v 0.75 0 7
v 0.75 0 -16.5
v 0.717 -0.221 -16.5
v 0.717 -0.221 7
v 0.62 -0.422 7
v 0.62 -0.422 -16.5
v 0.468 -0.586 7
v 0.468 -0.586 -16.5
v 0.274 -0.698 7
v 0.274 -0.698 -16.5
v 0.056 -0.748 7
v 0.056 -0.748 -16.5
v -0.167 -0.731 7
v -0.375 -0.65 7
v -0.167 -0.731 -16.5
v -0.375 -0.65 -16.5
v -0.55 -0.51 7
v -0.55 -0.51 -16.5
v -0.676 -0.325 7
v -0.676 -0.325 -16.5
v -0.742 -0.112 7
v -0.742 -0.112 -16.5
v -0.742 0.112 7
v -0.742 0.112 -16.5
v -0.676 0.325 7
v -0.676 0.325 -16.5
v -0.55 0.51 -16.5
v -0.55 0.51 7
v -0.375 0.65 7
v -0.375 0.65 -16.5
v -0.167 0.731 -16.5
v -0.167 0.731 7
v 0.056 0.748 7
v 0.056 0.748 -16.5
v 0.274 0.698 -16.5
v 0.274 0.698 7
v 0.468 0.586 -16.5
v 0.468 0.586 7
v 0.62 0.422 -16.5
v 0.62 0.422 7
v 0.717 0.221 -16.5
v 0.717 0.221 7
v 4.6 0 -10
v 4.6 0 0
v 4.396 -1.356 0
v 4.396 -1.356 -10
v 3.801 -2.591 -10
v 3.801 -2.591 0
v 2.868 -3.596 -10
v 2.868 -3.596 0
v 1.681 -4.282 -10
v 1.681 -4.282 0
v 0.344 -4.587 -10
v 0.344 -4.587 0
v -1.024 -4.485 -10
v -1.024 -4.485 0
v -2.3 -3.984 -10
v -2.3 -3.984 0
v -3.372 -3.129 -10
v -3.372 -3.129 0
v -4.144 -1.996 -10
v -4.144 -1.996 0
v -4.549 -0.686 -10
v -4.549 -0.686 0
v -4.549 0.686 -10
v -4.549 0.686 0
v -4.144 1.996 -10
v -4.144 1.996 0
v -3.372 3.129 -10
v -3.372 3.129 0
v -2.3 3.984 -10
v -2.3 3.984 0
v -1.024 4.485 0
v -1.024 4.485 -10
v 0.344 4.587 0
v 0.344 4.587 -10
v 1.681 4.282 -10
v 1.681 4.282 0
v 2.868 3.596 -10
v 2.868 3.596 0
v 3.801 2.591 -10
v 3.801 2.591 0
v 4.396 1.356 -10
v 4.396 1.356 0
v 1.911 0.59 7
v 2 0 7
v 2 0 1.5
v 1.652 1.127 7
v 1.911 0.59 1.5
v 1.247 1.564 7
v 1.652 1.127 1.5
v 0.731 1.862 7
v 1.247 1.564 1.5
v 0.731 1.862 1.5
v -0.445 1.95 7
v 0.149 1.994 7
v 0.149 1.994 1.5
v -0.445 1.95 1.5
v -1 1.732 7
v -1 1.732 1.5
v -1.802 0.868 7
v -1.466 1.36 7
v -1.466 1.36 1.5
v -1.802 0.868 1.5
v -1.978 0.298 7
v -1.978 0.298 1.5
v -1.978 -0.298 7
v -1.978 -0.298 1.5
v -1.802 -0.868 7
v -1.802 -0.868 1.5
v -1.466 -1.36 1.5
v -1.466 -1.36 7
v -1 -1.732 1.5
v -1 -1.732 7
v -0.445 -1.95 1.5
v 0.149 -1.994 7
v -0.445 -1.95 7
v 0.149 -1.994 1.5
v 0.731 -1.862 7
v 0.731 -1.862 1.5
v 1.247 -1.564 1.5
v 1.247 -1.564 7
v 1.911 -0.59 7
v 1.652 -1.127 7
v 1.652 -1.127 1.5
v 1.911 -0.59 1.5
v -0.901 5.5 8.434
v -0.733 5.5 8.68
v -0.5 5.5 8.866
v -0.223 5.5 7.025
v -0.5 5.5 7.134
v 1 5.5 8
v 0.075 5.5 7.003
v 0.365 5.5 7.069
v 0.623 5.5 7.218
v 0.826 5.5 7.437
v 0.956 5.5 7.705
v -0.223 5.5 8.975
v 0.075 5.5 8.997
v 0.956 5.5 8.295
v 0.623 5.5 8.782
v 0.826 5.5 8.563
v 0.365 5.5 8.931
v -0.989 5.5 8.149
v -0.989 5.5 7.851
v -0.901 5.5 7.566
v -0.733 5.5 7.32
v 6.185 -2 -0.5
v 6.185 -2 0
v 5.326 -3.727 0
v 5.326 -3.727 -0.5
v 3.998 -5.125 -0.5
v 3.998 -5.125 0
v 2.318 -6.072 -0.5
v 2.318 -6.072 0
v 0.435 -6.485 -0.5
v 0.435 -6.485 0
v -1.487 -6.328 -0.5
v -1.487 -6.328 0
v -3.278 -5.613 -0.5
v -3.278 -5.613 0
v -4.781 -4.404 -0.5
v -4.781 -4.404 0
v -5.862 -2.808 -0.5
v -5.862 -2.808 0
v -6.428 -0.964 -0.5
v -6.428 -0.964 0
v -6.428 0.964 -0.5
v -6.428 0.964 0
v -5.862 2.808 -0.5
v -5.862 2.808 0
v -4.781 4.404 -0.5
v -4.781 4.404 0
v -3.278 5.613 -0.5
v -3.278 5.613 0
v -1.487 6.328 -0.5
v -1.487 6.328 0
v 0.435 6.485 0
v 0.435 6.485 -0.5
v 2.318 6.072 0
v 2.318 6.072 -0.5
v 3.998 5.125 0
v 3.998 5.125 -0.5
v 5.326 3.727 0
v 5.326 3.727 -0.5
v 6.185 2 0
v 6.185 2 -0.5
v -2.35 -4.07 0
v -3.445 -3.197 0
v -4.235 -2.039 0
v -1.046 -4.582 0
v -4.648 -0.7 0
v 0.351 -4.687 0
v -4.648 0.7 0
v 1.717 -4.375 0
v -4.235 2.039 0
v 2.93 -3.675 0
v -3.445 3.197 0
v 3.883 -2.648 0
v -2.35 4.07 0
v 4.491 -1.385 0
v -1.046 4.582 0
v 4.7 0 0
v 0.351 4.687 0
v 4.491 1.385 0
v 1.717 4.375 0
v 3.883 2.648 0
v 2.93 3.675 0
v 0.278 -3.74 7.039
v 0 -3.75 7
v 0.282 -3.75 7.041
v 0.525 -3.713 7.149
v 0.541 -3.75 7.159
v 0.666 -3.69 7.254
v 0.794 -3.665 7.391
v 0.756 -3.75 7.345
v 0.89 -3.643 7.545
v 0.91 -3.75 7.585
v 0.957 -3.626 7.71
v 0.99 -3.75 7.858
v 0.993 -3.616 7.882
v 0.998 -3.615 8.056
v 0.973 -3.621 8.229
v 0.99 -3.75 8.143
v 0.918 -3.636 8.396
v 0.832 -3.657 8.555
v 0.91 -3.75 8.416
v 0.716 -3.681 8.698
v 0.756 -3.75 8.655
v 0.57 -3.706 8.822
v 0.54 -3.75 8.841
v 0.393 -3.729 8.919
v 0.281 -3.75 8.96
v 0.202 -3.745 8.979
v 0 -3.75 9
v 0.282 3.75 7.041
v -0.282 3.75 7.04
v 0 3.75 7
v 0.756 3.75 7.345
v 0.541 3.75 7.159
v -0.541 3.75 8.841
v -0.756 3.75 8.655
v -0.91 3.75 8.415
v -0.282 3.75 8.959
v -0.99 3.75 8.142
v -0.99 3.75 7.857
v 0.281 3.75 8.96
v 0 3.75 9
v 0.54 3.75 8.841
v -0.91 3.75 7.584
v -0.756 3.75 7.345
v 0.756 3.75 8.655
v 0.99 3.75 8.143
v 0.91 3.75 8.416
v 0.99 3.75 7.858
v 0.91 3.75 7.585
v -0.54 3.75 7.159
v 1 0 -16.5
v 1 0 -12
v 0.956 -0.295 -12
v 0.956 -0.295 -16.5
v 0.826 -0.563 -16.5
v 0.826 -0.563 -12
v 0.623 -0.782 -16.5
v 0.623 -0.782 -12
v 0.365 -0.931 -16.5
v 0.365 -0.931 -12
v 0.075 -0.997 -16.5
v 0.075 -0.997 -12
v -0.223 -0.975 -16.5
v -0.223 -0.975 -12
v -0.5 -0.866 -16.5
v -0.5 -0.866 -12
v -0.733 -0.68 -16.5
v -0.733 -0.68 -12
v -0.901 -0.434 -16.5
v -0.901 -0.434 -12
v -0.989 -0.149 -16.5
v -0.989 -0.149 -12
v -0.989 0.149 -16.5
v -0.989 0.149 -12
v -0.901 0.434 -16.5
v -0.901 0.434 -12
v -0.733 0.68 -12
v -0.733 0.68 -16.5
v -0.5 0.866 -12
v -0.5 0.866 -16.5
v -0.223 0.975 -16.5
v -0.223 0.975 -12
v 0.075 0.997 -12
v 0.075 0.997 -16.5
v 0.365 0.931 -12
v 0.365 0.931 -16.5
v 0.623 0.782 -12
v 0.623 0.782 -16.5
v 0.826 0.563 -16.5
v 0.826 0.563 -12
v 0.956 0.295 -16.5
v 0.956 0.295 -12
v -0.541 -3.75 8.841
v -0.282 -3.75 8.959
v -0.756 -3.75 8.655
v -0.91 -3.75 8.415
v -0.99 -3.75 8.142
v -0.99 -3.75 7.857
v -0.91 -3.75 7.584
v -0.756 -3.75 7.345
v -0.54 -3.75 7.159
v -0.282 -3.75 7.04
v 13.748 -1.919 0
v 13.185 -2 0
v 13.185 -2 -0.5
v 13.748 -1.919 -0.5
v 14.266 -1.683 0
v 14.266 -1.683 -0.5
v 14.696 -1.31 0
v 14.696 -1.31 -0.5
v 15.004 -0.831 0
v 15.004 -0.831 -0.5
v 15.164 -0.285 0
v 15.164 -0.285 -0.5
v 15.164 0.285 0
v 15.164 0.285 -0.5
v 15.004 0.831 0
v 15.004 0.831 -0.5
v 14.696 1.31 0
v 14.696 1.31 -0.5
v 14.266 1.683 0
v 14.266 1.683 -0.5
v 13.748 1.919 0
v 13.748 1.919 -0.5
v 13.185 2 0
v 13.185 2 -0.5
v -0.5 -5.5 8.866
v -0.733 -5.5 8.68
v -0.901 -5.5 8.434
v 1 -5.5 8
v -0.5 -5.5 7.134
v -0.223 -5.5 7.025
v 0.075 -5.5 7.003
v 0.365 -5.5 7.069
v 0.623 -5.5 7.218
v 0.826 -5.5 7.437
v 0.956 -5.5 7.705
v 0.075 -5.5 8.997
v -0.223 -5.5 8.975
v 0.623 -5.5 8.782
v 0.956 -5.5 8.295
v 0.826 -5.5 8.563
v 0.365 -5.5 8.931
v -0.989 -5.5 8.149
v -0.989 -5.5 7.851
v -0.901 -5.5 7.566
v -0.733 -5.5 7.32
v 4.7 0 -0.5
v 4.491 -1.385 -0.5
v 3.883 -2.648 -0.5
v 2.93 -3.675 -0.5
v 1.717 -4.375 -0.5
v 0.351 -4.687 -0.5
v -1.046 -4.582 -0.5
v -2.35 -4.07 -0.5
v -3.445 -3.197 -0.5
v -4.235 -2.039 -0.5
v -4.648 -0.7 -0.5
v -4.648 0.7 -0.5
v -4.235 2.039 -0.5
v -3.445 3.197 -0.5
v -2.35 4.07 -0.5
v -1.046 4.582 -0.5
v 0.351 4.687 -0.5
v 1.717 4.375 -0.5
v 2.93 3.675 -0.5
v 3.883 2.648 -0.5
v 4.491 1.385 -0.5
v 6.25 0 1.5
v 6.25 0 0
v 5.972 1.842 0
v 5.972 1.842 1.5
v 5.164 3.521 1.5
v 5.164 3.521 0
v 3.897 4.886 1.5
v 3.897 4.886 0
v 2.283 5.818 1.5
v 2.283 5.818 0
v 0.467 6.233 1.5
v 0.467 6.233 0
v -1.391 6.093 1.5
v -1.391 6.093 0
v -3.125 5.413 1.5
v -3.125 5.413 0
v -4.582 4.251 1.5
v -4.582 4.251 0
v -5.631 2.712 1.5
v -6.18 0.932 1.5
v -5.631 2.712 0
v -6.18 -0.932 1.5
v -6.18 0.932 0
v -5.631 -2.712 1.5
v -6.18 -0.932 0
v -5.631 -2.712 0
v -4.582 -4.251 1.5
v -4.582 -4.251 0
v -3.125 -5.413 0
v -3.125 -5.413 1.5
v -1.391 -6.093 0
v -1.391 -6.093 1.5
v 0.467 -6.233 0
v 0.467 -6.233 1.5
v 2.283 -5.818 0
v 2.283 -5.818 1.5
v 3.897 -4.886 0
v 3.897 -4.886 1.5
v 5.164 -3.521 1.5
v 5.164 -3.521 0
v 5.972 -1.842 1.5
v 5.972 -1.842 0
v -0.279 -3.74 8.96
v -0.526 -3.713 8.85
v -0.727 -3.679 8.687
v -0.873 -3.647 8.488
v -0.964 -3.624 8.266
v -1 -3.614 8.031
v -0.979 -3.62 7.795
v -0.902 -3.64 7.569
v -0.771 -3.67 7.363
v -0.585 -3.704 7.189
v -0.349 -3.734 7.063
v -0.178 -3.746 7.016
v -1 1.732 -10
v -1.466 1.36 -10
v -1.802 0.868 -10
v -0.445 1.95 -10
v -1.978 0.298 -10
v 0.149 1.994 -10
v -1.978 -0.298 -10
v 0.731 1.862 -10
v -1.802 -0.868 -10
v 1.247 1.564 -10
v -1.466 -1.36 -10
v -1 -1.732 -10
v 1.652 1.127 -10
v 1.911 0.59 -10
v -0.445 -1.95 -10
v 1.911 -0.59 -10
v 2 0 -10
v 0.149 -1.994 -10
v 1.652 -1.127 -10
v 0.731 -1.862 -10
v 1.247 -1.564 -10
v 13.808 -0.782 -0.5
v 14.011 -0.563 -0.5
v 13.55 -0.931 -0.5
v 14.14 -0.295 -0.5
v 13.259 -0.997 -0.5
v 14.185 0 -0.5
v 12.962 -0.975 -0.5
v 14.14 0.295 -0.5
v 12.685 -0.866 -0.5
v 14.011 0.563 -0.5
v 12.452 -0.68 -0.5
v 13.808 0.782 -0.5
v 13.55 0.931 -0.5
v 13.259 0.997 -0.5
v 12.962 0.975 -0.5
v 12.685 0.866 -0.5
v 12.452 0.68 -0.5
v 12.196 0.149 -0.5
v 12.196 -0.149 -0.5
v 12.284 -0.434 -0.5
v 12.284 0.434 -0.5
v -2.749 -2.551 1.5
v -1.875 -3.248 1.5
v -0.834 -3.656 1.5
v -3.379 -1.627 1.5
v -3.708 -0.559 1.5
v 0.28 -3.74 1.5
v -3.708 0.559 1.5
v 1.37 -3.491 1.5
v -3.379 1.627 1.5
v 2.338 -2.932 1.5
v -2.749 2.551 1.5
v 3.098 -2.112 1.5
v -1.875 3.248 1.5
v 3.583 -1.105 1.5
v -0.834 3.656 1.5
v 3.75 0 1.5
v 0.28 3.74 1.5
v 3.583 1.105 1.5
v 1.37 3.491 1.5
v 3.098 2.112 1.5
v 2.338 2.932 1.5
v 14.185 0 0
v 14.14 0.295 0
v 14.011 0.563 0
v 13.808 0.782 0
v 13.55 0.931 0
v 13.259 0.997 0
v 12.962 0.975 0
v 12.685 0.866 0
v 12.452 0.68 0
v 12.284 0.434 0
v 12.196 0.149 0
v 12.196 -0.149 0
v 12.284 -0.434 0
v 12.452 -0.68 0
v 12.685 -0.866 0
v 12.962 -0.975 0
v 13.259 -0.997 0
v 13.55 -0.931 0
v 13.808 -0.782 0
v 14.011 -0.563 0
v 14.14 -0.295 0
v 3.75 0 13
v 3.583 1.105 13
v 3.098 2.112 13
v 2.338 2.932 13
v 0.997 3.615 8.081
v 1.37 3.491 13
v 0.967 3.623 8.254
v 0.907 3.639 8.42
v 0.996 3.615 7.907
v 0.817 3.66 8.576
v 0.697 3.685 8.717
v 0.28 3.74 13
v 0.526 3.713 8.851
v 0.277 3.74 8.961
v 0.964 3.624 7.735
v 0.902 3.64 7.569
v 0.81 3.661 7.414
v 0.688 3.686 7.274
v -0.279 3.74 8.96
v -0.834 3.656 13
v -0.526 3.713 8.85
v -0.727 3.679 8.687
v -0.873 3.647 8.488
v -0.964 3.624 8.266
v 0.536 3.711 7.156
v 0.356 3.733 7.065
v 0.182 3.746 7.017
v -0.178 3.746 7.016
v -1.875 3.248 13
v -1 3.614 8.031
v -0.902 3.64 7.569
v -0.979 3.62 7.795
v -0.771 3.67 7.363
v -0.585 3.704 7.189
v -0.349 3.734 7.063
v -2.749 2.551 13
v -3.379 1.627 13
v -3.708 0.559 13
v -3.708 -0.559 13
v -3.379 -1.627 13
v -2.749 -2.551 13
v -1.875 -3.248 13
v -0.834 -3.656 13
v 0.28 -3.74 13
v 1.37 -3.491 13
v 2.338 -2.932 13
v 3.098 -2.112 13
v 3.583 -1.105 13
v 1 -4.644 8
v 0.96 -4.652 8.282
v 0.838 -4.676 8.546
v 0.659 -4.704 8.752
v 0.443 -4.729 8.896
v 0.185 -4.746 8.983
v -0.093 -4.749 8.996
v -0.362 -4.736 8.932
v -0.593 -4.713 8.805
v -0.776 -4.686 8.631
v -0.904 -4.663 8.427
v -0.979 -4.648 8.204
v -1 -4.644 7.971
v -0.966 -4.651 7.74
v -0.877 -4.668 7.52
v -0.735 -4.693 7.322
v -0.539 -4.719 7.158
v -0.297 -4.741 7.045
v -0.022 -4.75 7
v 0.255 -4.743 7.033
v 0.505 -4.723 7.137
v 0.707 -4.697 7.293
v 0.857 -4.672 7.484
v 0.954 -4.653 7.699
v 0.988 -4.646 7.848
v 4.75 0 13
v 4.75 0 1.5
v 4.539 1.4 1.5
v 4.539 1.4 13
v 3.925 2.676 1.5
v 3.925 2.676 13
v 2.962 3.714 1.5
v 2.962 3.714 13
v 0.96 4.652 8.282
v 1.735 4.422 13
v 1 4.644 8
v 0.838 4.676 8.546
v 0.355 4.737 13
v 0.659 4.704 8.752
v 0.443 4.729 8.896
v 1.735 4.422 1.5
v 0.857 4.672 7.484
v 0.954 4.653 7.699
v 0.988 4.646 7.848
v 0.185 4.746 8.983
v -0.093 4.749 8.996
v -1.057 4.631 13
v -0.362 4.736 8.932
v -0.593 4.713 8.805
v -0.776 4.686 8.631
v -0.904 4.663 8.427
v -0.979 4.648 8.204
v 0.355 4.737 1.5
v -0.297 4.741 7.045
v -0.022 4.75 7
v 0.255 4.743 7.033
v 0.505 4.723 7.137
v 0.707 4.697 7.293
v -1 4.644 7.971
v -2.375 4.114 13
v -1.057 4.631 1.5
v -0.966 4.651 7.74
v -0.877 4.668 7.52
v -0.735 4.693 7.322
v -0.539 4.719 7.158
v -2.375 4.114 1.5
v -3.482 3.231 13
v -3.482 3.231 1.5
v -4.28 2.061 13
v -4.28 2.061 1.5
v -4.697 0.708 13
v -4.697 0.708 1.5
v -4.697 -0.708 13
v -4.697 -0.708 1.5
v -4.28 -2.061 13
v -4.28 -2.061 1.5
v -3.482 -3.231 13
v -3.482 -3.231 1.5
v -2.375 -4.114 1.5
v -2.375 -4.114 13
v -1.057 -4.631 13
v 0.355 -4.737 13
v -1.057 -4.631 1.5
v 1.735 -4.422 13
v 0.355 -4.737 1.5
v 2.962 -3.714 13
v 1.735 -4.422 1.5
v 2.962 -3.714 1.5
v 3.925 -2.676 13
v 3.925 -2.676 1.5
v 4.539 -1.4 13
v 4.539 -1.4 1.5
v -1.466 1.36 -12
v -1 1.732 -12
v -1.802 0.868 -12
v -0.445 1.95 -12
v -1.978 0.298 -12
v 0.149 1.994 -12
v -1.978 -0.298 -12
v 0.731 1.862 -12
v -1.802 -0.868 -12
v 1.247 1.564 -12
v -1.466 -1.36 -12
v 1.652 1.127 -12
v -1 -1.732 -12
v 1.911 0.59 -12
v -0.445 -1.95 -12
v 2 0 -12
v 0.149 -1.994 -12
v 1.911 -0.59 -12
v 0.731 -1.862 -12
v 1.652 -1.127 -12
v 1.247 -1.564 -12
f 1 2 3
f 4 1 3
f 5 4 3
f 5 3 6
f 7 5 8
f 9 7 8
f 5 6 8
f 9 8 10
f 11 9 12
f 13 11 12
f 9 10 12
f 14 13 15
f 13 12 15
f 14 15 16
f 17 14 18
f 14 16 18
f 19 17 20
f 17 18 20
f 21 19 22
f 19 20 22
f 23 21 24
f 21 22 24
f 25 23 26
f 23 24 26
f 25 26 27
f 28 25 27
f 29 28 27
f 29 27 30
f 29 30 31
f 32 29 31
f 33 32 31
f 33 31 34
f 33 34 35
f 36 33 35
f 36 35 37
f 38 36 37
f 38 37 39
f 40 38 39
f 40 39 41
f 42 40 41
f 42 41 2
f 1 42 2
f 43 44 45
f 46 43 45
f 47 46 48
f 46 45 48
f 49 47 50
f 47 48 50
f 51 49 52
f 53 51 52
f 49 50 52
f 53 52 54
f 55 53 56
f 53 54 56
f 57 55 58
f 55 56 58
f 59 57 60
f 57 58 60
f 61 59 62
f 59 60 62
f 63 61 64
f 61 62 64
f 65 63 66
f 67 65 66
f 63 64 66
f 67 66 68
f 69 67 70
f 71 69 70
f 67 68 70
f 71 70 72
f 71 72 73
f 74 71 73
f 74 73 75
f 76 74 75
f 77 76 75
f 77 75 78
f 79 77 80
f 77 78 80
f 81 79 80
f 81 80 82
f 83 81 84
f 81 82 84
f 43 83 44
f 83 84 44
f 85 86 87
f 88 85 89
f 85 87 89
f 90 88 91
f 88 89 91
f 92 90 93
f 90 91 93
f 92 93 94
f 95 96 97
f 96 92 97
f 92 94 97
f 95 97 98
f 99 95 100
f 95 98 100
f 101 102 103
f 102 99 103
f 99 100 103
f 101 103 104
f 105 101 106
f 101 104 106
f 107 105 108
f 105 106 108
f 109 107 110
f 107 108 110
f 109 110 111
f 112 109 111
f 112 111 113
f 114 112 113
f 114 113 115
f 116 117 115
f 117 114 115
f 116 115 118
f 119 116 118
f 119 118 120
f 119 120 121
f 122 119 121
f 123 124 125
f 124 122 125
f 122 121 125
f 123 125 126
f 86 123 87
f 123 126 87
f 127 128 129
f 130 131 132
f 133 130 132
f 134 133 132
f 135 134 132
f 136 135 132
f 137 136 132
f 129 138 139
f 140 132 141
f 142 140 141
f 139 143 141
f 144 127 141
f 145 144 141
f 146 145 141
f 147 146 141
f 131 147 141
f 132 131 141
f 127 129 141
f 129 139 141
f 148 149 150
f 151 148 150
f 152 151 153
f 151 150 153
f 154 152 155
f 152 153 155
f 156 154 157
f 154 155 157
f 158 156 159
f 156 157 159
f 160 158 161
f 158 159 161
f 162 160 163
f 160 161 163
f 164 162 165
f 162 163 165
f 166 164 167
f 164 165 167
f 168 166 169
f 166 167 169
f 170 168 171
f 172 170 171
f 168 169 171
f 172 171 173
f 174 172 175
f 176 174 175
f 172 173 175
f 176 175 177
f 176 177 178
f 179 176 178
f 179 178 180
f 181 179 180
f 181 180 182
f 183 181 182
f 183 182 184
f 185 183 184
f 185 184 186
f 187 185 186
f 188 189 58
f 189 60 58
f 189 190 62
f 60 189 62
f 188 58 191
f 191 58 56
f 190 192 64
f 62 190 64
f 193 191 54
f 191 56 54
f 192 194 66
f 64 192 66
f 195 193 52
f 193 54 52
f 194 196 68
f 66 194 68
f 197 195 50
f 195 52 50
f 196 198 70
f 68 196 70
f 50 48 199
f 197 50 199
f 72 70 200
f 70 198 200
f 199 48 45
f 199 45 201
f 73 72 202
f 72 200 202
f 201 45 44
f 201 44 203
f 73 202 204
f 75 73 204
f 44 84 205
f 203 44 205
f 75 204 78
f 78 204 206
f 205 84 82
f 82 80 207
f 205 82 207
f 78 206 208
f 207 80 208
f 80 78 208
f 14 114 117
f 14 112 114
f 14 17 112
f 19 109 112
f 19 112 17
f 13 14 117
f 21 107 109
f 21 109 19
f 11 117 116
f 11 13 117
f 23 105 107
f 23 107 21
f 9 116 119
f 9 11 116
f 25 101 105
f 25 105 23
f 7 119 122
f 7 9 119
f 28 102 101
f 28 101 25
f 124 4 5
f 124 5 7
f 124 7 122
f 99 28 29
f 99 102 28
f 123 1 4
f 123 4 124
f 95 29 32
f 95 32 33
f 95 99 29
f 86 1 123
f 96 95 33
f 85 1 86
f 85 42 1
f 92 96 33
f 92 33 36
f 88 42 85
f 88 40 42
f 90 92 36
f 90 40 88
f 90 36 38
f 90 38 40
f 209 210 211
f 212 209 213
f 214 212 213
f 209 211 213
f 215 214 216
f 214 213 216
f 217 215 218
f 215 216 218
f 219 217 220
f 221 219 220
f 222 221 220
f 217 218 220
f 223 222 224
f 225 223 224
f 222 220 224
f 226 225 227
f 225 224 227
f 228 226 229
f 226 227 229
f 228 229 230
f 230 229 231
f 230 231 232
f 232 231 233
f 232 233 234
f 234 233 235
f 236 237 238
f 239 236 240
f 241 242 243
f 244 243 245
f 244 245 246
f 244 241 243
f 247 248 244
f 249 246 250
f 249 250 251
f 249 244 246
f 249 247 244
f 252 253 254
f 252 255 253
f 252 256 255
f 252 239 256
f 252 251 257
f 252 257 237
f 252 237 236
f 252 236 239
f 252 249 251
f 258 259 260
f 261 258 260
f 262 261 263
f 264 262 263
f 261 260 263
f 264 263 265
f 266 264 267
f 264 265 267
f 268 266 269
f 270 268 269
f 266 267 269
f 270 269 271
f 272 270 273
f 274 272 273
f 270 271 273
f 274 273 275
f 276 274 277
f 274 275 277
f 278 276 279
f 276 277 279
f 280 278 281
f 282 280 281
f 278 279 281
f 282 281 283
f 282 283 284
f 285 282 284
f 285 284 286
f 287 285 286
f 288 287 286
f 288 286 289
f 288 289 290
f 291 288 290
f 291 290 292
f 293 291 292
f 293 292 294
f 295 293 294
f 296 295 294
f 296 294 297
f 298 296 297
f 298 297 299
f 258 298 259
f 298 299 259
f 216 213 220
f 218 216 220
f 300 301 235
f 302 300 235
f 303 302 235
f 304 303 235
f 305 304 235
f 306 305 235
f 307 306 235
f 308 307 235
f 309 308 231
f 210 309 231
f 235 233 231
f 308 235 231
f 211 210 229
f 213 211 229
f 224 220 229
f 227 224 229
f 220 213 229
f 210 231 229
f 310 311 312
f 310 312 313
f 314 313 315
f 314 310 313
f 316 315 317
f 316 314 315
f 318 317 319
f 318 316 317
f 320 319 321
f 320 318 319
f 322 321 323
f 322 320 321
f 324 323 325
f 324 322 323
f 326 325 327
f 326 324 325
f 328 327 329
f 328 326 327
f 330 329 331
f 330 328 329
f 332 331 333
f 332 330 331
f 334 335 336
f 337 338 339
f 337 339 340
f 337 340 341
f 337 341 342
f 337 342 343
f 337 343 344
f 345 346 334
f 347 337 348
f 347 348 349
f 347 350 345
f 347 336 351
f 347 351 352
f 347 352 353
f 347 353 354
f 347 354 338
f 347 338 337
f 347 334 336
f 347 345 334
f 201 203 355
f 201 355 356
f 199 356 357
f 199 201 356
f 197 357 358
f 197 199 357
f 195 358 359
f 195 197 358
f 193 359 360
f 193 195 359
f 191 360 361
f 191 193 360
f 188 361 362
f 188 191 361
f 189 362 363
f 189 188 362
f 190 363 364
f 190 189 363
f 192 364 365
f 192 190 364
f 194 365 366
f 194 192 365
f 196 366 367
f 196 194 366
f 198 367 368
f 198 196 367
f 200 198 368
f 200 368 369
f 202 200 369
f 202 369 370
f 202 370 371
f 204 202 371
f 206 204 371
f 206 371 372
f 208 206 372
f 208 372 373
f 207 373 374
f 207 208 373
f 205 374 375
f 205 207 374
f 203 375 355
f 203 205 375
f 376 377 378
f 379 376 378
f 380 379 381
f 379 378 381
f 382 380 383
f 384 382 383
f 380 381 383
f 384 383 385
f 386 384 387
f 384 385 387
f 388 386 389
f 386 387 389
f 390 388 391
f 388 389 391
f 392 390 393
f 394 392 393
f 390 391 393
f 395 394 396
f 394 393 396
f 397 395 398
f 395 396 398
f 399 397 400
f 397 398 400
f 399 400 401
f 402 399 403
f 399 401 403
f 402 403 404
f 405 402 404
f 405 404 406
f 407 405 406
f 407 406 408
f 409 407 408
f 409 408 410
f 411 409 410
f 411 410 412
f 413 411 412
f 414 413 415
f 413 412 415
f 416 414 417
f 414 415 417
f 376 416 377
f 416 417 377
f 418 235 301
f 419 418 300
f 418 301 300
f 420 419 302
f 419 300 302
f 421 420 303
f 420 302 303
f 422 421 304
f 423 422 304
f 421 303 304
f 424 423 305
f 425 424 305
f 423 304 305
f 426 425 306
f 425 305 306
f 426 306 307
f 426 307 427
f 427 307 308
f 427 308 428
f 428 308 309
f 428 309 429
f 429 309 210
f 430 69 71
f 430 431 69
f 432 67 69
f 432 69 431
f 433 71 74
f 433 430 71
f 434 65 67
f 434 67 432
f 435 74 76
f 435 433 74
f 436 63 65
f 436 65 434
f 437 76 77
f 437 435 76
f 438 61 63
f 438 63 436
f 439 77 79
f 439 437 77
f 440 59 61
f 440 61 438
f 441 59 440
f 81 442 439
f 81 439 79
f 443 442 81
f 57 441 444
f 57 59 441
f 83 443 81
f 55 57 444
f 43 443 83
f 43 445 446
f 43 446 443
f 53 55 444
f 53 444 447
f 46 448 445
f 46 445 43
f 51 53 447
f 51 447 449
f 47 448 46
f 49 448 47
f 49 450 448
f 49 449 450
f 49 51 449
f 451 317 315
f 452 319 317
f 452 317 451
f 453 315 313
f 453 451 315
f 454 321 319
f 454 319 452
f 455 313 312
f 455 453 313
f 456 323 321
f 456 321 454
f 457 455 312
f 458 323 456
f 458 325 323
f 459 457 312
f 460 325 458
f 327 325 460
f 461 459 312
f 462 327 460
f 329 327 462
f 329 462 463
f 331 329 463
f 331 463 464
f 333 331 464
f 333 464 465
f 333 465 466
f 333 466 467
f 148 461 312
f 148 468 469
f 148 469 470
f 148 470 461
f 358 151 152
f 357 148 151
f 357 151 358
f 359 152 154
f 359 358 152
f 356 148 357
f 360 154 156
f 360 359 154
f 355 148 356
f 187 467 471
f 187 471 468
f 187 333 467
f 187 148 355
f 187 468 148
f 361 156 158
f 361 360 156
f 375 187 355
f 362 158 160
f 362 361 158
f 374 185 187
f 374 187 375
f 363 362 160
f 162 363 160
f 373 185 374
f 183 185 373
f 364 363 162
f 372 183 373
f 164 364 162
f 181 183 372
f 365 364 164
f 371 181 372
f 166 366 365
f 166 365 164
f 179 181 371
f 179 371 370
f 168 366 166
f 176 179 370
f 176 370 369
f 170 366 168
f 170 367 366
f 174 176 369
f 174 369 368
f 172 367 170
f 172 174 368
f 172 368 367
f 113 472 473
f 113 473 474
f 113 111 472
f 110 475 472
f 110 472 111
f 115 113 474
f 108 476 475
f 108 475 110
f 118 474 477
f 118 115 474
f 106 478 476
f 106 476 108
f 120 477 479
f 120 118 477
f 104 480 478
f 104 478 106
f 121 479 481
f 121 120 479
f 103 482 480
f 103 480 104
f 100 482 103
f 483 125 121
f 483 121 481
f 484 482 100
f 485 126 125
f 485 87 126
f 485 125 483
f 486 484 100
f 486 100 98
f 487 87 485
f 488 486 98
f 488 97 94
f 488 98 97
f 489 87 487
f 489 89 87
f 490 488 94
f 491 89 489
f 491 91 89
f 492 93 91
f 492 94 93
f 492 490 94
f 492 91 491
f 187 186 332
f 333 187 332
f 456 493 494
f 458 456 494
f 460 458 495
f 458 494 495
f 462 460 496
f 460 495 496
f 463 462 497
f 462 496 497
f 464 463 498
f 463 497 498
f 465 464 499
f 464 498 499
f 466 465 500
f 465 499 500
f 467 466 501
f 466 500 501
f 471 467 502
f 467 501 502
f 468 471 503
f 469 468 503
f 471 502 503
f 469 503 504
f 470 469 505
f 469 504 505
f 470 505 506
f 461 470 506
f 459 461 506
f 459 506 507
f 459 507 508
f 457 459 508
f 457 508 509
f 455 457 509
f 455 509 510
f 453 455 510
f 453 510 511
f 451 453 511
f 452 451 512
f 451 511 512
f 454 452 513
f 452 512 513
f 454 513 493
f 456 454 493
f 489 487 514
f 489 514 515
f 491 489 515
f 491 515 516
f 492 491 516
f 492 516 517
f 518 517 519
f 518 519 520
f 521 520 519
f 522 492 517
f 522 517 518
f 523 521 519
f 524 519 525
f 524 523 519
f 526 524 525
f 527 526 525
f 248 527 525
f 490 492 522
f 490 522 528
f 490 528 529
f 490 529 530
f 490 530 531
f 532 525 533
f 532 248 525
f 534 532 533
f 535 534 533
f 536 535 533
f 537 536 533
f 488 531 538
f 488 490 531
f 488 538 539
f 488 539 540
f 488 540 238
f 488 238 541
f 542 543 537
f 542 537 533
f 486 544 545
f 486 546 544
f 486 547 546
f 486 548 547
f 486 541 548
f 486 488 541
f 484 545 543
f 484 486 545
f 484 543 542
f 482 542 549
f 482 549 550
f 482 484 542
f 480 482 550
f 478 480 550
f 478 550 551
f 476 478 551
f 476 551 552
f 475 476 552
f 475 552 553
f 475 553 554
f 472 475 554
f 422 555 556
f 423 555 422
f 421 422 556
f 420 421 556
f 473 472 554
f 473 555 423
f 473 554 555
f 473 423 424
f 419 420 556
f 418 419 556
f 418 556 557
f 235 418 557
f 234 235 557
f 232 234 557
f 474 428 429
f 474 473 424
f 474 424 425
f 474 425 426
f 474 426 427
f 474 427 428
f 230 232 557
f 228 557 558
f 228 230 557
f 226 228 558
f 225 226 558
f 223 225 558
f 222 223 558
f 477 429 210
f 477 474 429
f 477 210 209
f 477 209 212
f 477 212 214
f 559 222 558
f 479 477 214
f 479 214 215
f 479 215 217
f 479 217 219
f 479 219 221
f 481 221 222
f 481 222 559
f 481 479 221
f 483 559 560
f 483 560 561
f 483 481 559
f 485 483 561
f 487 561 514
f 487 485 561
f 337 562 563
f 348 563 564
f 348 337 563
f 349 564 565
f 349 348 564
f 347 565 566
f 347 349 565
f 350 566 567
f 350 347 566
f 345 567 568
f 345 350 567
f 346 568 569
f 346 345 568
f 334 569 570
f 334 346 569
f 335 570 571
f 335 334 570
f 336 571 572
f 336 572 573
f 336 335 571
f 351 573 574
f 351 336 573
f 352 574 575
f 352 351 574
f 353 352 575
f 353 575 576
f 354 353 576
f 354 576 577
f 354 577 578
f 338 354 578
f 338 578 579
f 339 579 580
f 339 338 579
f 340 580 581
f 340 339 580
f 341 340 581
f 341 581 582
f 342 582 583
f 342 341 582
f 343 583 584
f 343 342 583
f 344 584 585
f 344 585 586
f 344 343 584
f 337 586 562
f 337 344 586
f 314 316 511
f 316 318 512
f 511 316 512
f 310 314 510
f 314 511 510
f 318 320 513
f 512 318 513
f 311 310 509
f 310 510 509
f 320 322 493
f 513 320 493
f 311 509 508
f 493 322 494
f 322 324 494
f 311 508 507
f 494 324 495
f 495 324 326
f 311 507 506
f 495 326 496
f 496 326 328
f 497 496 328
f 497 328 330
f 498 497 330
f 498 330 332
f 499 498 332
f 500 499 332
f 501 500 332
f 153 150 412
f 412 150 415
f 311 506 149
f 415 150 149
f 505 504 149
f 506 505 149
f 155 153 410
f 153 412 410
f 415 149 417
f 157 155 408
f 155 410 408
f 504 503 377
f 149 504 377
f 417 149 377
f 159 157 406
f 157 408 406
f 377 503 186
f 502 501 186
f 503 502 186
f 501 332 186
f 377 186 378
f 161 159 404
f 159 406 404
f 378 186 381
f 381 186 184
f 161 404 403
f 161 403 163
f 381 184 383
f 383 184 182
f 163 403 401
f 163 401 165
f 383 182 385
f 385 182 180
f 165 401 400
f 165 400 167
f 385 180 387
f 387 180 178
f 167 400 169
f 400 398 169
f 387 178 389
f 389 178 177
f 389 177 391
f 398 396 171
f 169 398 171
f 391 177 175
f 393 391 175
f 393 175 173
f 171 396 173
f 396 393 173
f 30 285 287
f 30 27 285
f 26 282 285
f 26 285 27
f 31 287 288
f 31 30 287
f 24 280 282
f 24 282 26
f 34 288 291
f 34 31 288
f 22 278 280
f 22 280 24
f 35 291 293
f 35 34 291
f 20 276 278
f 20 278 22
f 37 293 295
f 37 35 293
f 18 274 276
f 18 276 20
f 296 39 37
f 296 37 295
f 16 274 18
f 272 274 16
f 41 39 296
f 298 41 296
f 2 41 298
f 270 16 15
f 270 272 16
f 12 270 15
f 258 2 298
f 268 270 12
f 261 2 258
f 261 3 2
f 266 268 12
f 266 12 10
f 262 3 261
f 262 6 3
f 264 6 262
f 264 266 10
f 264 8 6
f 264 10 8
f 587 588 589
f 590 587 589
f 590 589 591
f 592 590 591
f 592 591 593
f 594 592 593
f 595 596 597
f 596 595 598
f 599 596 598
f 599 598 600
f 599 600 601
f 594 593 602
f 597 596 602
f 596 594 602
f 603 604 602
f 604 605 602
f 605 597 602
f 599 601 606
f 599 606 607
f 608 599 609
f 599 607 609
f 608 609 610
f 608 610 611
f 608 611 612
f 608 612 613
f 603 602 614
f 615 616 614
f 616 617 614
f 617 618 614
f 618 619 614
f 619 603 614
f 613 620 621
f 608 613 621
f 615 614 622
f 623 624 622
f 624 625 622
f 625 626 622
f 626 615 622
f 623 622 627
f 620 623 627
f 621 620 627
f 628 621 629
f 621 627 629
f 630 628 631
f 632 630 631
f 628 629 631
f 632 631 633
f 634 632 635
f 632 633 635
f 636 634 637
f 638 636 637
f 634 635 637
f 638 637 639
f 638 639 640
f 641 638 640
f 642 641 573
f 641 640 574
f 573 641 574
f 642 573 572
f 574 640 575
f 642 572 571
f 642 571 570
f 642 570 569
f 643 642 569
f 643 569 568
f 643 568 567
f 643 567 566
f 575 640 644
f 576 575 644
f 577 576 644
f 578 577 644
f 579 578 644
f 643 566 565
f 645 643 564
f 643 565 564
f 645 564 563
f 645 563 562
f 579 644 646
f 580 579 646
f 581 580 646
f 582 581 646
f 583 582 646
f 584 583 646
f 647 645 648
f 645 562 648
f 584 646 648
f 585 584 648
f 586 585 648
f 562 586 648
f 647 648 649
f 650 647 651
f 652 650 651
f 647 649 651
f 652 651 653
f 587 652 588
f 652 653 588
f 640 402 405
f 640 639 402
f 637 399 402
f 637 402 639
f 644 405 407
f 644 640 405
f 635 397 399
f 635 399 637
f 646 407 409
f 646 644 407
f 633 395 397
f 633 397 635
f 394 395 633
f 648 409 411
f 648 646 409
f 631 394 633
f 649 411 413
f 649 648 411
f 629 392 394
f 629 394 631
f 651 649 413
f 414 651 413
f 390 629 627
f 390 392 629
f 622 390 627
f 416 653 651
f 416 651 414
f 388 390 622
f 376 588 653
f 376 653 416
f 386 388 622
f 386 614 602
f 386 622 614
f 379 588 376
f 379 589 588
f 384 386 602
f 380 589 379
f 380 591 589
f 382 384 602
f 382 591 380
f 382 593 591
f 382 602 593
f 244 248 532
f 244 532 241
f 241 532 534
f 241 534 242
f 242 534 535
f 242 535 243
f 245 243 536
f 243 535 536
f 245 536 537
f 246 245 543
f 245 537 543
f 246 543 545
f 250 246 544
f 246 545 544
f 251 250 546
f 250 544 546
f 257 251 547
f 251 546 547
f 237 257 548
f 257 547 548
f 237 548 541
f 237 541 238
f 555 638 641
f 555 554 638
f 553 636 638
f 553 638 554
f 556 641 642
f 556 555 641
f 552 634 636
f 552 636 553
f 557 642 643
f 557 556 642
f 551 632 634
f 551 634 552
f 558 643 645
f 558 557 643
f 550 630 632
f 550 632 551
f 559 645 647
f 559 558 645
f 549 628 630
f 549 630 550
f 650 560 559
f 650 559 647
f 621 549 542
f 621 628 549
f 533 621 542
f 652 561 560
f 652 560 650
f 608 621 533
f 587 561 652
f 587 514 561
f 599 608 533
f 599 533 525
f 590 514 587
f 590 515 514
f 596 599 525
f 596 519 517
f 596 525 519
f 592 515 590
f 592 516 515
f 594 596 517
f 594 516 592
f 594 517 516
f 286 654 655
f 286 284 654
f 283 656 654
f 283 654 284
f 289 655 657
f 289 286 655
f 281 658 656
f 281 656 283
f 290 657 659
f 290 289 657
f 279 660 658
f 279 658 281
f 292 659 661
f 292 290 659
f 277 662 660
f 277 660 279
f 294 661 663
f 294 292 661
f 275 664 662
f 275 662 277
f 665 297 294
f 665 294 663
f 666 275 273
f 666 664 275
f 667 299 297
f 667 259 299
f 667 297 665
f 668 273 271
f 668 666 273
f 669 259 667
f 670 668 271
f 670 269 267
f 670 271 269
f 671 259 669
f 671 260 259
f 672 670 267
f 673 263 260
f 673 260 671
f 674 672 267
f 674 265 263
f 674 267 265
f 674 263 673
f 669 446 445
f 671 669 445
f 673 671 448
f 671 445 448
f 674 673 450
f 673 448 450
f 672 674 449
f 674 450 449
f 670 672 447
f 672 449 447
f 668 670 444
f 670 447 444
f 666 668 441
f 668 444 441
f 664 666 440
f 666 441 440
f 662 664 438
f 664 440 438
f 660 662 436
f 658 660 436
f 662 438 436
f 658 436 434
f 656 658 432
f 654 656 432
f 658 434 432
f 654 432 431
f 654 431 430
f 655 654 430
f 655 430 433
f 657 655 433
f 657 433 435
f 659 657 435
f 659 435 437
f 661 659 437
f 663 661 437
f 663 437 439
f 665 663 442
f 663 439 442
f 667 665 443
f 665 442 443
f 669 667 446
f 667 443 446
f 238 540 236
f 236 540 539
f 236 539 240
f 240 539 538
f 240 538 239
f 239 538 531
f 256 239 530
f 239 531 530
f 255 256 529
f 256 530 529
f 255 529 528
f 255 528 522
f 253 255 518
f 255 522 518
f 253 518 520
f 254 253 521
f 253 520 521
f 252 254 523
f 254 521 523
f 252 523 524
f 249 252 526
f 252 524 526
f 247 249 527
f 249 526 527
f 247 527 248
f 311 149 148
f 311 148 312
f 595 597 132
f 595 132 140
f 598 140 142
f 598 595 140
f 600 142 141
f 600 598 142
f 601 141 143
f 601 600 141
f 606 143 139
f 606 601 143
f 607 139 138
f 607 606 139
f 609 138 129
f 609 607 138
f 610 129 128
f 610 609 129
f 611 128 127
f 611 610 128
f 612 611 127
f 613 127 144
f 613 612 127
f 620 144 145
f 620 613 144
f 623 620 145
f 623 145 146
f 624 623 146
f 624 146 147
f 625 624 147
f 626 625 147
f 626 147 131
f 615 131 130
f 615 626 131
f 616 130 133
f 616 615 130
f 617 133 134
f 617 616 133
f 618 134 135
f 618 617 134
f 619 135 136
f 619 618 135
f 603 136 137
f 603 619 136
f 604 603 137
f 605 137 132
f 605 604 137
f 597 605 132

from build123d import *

# Parameters (mm, degrees)
SKETCH_R        = 6.25
PAD_DEPTH       = 1.5
SKETCH001_R     = 4.6
PAD001_DEPTH    = 10
SKETCH002_R     = 2
PAD002_DEPTH    = 2
SKETCH003_R     = 1
PAD003_DEPTH    = 4.5
SKETCH006_R     = 4.75
SKETCH006_R_2   = 3.75
PAD004_DEPTH    = 11.5
SKETCH007_R     = 2
PAD005_DEPTH    = 5.5
SKETCH004_R     = 0.75
POCKET_DEPTH    = 29.501
SKETCH008_R     = 1
PAD006_DEPTH    = 5.5
SKETCH009_R     = 1
POCKET001_DEPTH = 3.75
SKETCH010_R     = 6.5
SKETCH010_R_2   = 4.7
PAD007_DEPTH    = 0.5
SKETCH011_R     = 1
PAD008_DEPTH    = 0.5


with BuildPart() as part:
    # Sketch → Pad (new body)
    with BuildSketch(Plane.XY):
        Circle(SKETCH_R)
    extrude(amount=PAD_DEPTH)

    # Sketch001 (on Face2 of Pad) → Pad001 (join)
    with BuildSketch(Plane(origin=(0, 0, 0), x_dir=(1, 0, 0), z_dir=(0, 0, -1))):
        Circle(SKETCH001_R)
    extrude(amount=PAD001_DEPTH)

    # Sketch002 (on Face5 of Pad001) → Pad002 (join)
    with BuildSketch(Plane(origin=(0, 0, -10), x_dir=(1, 0, 0), z_dir=(0, 0, -1))):
        Circle(SKETCH002_R)
    extrude(amount=PAD002_DEPTH)

    # Sketch003 (on Face7 of Pad002) → Pad003 (join)
    with BuildSketch(Plane(origin=(0, 0, -12), x_dir=(1, 0, 0), z_dir=(0, 0, -1))):
        Circle(SKETCH003_R)
    extrude(amount=PAD003_DEPTH)

    # Sketch006 → Pad004 (join)
    with BuildSketch(Plane.XY.offset(1.5)):
        Circle(SKETCH006_R)
        Circle(SKETCH006_R_2, mode=Mode.SUBTRACT)
    extrude(amount=PAD004_DEPTH)

    # Sketch007 (on Face11 of Pad004) → Pad005 (join)
    with BuildSketch(Plane.XY.offset(1.5)):
        Circle(SKETCH007_R)
    extrude(amount=PAD005_DEPTH)

    # Sketch004 (on Face9 of Pad003) → Pocket (cut, through all)
    with BuildSketch(Plane(origin=(0, 0, -16.5), x_dir=(1, 0, 0), z_dir=(0, 0, -1))):
        Circle(SKETCH004_R)
    extrude(amount=-POCKET_DEPTH, mode=Mode.SUBTRACT)

    # Sketch008 → Pad006 (join, symmetric)
    with BuildSketch(Plane.XZ):
        with Locations((0, 8)):
            Circle(SKETCH008_R)
    extrude(amount=PAD006_DEPTH, both=True)

    # Sketch009 → Pocket001 (cut, symmetric)
    with BuildSketch(Plane.XZ):
        with Locations((0, 8)):
            Circle(SKETCH009_R)
    extrude(amount=POCKET001_DEPTH, both=True, mode=Mode.SUBTRACT)

    # Sketch010 (on Face2 of Pocket001) → Pad007 (join)
    with BuildSketch(Plane(origin=(0, 0, 0), x_dir=(1, 0, 0), z_dir=(0, 0, -1))):
        Circle(SKETCH010_R)
        Circle(SKETCH010_R_2, mode=Mode.SUBTRACT)
    extrude(amount=PAD007_DEPTH)

    # Sketch011 → Pad008 (join)
    with BuildSketch(Plane.XY):
        with BuildLine():
            Line((6.184658, 2), (13.184658, 2))
            ThreePointArc((13.184658, -2), (15.184658, 0), (13.184658, 2))
            Line((6.184658, -2), (13.184658, -2))
            ThreePointArc((6.184658, -2), (6.5, 0), (6.184658, 2))
        make_face()
        with Locations((13.184658, 0)):
            Circle(SKETCH011_R, mode=Mode.SUBTRACT)
    extrude(amount=-PAD008_DEPTH)


solid = part.part
